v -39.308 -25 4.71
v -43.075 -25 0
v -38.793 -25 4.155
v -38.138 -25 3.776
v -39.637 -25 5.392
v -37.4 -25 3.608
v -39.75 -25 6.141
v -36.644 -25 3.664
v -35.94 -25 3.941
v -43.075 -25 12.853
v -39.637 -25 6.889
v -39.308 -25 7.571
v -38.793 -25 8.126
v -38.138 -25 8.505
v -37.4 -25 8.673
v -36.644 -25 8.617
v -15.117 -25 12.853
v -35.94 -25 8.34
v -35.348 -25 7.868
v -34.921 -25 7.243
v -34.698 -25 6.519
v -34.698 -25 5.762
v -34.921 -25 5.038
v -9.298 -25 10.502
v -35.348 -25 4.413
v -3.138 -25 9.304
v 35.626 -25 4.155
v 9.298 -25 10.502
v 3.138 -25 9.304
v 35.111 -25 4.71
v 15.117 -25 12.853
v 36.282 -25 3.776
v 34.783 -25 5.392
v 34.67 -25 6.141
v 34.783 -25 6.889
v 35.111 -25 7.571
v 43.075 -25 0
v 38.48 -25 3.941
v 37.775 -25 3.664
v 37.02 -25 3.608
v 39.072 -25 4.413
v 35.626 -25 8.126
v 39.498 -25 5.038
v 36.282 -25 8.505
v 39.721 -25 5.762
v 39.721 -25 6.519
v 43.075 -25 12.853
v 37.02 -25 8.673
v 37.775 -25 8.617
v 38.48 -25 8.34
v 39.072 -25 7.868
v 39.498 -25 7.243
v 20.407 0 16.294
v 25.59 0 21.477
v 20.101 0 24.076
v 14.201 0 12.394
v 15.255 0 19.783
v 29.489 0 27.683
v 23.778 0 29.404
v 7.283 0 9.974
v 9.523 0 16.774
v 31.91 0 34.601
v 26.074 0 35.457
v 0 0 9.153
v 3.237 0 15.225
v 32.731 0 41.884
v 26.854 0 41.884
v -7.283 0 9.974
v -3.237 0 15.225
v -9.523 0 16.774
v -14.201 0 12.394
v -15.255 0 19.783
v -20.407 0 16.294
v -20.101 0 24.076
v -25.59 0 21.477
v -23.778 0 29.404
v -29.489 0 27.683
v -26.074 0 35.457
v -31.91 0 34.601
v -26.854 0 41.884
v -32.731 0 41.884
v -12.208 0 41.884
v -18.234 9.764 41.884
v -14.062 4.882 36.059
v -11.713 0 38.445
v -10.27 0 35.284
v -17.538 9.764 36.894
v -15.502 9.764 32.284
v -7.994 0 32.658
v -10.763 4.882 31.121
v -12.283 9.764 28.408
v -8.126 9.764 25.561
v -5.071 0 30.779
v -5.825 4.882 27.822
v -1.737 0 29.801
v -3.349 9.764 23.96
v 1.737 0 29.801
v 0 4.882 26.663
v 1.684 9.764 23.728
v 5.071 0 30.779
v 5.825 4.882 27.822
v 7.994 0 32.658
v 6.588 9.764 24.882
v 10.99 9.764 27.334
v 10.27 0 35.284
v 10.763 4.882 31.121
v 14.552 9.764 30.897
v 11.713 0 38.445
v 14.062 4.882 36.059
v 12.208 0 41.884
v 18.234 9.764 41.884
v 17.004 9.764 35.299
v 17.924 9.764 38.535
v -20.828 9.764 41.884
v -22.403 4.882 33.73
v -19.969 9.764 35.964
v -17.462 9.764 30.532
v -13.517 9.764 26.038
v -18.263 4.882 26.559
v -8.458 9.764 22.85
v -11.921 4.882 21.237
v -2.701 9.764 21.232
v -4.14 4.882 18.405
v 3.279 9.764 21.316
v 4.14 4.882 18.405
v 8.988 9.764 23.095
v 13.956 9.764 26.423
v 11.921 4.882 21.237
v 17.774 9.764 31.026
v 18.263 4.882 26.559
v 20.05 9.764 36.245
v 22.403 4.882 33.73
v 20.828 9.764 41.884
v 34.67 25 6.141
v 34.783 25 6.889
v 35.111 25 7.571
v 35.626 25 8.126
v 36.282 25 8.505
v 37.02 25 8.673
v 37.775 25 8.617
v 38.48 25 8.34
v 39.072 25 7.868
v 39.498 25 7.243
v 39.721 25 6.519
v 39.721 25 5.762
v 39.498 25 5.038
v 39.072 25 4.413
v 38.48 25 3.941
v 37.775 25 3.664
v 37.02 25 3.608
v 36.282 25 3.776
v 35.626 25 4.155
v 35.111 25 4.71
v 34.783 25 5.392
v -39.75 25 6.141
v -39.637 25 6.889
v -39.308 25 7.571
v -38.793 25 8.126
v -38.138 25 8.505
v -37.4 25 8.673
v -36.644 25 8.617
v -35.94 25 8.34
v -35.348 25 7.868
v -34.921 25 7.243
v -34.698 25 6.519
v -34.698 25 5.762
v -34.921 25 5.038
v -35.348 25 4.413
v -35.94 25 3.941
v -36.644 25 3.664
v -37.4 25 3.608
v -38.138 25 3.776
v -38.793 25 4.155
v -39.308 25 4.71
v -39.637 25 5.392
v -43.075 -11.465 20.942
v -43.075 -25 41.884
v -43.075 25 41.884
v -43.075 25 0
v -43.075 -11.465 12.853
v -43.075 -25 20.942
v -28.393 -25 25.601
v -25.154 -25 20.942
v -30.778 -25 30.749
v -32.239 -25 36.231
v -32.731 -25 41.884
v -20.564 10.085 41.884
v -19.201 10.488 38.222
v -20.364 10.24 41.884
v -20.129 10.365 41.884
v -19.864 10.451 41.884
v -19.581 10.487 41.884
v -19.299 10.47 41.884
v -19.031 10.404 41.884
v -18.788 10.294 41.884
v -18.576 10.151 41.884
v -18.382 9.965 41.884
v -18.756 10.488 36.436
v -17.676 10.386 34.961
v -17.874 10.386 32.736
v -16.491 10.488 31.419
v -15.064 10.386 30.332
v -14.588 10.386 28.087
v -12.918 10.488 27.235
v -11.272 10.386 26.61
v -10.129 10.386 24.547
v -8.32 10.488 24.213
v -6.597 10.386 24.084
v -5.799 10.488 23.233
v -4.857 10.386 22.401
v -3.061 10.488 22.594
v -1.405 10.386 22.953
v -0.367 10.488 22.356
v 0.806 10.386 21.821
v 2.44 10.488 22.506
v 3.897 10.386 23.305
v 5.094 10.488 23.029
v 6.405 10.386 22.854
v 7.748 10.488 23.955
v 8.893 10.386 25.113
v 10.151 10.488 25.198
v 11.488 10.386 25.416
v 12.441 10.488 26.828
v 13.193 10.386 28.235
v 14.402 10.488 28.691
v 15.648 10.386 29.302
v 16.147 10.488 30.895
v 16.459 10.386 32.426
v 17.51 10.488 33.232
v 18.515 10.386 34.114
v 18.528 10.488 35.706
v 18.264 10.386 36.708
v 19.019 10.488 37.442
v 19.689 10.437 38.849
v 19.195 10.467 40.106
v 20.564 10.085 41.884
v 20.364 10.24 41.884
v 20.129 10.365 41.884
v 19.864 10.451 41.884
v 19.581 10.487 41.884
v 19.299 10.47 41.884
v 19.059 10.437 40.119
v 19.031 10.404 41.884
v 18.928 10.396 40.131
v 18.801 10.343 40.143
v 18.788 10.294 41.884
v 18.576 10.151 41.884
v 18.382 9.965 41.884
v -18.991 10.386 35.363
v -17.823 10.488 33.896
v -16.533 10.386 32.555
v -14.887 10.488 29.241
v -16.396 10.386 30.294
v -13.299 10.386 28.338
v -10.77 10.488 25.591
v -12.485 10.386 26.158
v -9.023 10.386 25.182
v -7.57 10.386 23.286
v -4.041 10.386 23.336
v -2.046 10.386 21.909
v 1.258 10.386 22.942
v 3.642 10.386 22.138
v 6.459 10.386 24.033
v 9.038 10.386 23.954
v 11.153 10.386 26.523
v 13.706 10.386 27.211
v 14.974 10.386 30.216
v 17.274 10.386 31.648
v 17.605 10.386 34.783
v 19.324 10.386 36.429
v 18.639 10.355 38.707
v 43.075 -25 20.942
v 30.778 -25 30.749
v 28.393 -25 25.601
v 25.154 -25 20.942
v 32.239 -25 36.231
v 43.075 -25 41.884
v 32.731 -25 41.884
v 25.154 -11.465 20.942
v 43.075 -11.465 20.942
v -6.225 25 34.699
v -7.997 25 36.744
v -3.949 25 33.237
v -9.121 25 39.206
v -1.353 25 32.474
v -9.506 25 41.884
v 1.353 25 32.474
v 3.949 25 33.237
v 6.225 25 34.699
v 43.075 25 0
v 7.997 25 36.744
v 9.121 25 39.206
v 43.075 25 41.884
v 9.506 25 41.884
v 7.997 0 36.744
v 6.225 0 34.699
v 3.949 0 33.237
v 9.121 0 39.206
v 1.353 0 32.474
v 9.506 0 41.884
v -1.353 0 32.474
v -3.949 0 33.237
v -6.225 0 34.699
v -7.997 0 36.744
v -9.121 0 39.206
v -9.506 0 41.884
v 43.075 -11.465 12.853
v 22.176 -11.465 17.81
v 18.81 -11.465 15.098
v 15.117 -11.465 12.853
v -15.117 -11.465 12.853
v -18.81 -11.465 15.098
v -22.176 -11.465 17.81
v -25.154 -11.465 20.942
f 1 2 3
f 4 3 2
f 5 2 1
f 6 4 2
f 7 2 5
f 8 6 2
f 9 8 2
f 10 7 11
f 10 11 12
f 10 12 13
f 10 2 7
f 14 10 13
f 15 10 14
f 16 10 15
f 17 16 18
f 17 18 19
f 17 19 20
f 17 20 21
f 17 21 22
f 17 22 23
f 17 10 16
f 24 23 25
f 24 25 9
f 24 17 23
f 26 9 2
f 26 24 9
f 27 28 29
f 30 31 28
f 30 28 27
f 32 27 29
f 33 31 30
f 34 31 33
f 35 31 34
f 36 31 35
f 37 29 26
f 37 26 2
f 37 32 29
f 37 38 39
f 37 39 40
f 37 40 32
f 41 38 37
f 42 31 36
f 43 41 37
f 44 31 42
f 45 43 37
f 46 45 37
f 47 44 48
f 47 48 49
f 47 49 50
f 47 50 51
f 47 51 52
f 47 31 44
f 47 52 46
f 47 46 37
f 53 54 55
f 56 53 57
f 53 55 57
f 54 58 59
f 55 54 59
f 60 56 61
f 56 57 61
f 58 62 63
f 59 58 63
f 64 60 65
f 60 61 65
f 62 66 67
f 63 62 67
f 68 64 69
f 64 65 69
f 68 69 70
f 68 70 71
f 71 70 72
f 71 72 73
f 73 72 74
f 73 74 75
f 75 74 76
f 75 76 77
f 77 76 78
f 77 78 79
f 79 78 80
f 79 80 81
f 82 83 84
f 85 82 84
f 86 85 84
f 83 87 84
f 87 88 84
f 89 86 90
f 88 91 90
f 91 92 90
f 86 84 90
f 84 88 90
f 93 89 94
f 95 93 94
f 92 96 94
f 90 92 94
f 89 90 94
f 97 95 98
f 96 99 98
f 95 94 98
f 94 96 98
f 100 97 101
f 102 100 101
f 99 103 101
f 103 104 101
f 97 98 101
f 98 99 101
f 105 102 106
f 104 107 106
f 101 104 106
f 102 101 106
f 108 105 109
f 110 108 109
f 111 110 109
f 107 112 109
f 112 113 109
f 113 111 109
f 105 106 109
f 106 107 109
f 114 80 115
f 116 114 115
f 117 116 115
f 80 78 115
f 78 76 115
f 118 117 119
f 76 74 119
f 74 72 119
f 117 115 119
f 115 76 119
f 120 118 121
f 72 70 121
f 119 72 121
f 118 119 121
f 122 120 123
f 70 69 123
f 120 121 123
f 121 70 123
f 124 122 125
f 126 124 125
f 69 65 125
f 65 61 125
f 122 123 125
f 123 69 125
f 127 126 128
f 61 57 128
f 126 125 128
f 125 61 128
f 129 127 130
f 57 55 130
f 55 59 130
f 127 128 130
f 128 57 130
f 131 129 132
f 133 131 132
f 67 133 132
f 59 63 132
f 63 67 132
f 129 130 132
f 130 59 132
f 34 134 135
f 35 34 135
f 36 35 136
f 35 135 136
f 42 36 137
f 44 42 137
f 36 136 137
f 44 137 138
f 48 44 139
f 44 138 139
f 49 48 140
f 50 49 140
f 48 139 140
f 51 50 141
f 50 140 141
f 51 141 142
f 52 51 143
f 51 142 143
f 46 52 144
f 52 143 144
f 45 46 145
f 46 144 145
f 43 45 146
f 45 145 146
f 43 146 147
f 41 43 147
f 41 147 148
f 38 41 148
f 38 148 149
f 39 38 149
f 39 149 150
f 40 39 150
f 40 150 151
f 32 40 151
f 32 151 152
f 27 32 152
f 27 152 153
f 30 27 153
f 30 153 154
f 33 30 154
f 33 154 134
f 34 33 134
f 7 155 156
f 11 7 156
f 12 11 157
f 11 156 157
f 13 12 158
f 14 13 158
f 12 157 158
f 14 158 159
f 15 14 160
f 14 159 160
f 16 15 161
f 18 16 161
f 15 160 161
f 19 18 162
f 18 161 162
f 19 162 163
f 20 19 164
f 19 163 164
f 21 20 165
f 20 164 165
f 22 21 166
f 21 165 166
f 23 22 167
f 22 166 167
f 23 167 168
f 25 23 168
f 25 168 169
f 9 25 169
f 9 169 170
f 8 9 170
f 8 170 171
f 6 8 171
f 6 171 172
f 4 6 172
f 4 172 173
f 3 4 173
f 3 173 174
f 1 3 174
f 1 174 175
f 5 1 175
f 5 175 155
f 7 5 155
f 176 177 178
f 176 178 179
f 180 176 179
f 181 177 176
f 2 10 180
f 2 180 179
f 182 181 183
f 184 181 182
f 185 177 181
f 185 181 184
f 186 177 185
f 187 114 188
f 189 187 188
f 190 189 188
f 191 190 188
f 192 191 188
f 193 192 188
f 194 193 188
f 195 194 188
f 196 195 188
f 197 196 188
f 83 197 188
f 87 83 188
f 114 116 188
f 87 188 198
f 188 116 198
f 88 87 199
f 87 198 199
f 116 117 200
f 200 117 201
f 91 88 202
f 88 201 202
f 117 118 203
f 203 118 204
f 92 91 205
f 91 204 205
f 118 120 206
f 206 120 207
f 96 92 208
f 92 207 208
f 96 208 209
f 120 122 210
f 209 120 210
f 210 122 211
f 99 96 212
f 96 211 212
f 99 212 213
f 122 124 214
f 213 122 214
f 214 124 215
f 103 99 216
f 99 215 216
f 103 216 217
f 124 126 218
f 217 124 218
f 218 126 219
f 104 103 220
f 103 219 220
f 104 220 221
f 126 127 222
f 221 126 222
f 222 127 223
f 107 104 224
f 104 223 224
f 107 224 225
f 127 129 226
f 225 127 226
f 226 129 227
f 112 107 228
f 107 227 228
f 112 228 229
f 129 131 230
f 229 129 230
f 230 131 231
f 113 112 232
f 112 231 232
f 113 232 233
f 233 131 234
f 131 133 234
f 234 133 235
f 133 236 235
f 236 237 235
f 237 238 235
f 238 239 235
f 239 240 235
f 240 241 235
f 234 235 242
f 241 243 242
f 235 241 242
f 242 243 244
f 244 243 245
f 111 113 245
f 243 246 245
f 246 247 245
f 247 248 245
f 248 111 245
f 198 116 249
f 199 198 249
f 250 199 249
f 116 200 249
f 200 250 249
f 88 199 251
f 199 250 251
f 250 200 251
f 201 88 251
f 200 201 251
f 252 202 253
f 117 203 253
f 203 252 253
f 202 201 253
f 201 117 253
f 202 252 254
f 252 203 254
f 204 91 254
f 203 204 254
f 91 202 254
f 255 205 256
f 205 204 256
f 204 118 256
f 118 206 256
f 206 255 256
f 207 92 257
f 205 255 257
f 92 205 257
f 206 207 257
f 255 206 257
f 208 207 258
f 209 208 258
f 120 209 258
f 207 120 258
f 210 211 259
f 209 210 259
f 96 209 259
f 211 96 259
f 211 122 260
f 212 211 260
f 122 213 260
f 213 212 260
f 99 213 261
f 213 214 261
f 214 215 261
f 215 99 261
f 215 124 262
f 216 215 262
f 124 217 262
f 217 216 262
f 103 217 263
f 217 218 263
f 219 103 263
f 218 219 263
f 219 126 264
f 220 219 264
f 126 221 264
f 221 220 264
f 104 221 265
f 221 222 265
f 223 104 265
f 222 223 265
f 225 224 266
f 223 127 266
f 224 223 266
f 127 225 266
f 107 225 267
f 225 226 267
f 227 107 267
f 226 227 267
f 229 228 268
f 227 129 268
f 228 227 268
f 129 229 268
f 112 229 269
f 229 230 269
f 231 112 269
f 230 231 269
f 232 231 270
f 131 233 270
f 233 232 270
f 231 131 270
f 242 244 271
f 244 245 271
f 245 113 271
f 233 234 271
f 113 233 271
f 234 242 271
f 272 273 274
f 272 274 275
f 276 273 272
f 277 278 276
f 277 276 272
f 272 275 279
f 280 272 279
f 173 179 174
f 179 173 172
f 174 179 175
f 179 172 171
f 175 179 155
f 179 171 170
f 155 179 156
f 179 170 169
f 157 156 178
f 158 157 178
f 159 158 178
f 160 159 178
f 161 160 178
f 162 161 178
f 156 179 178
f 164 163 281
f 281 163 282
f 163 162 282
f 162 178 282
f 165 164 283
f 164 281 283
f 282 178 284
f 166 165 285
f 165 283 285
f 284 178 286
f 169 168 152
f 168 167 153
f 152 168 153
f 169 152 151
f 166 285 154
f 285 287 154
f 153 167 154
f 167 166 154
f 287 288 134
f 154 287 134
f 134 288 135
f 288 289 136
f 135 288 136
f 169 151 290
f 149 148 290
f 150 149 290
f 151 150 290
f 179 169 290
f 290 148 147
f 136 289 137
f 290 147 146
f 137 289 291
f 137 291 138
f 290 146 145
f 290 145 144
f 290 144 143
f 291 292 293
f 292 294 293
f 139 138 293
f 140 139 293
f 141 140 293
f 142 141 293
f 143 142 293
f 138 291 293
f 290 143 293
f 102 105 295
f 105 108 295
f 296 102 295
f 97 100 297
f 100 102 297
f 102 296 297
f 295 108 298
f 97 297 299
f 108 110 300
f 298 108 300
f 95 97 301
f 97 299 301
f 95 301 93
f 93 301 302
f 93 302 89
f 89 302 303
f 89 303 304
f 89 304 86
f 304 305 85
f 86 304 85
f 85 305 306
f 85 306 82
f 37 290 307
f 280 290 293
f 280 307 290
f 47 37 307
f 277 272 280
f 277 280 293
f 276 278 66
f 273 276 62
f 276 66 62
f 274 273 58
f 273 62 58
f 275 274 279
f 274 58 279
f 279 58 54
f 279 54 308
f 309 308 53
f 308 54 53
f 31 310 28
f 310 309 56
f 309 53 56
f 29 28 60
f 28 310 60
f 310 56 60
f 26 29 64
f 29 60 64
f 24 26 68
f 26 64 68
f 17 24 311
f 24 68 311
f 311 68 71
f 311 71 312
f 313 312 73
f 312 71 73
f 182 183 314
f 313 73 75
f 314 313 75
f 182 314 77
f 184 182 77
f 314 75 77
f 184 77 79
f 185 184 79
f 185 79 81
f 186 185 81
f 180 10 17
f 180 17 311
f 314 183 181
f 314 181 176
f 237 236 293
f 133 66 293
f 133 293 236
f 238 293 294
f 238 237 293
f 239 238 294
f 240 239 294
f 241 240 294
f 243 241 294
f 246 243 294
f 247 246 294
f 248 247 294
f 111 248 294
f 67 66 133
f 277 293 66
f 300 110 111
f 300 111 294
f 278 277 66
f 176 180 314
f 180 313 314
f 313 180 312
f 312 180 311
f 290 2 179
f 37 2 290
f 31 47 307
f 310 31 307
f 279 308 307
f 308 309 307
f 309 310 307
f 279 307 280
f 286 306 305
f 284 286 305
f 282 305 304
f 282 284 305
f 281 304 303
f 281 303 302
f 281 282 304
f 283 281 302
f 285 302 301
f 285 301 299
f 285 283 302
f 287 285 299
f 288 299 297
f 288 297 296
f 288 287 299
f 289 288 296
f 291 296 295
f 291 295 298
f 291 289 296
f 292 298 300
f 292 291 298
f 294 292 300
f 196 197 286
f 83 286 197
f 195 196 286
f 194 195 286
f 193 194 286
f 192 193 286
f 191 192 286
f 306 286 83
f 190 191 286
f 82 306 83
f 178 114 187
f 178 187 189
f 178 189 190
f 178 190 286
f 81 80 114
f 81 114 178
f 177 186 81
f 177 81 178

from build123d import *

# Parameters (mm, degrees)
F1_DEPTH = 25
F4_W     = 32.7306911349
F4_H     = 25
F6_R     = 1.524
F7_W     = 13.5347936116
F7_H     = 8.0888392404
F8_DEPTH = 86.1515196498
F9_W     = 9.5062525943
F9_H     = 25
F12_D    = 5.08


with BuildPart() as f1:
    # F0 (on Front) → F1 (new body, symmetric)
    with BuildSketch(Plane.XZ):
        Polygon((-43.0752597749, 41.8838150799), (-43.0752597749, 0), (0, 0), (43.0752597749, 0), (43.0752597749, 41.8838150799), align=None)
    extrude(amount=F1_DEPTH, both=True)

    # F2 (on face) → F3 (revolve, cut)
    with BuildSketch(Plane.XY.offset(41.8838150799)):
        Polygon((-19.5309855044, 11.865561828), (-26.8544312567, 0), (-12.2075397521, 0), align=None)
    revolve(axis=Axis((0, 0, 41.8838150799), (0, -1, 0)), mode=Mode.SUBTRACT)

    # F4 (on face) → F5 (revolve, cut)
    with BuildSketch(Plane.XY.offset(41.8838150799)):
        with Locations((-16.3653455675, -12.5)):
            Rectangle(F4_W, F4_H)
    revolve(axis=Axis((0, -12.5, 41.8838150799), (0, 1, 0)), mode=Mode.SUBTRACT)

    # F6
    f6_edges = [f1.edges().sort_by_distance(p)[0] for p in [
        (0, 11.865562, 22.35283),
    ]]
    fillet(f6_edges, radius=F6_R)

    # F7 (on face) → F8 (cut, through all)
    with BuildSketch(Plane.YZ.offset(43.0752597749)):
        with Locations((-18.2326031942, 16.8974879198)):
            Rectangle(F7_W, F7_H)
    extrude(amount=-F8_DEPTH, mode=Mode.SUBTRACT)

    # F9 (on face) → F10 (revolve, cut)
    with BuildSketch(Plane.XY.offset(41.8838150799)):
        with Locations((-4.7531262971, 12.5)):
            Rectangle(F9_W, F9_H)
    revolve(axis=Axis((0, 12.5, 41.8838150799), (0, -1, 0)), mode=Mode.SUBTRACT)

    # F12 (through all)
    with Locations(Plane.XZ.offset(25)):
        with Locations((-37.2096933424, 6.1405156739), (37.2096933424, 6.1405156739)):
            Hole(F12_D / 2)


solid = f1.part
